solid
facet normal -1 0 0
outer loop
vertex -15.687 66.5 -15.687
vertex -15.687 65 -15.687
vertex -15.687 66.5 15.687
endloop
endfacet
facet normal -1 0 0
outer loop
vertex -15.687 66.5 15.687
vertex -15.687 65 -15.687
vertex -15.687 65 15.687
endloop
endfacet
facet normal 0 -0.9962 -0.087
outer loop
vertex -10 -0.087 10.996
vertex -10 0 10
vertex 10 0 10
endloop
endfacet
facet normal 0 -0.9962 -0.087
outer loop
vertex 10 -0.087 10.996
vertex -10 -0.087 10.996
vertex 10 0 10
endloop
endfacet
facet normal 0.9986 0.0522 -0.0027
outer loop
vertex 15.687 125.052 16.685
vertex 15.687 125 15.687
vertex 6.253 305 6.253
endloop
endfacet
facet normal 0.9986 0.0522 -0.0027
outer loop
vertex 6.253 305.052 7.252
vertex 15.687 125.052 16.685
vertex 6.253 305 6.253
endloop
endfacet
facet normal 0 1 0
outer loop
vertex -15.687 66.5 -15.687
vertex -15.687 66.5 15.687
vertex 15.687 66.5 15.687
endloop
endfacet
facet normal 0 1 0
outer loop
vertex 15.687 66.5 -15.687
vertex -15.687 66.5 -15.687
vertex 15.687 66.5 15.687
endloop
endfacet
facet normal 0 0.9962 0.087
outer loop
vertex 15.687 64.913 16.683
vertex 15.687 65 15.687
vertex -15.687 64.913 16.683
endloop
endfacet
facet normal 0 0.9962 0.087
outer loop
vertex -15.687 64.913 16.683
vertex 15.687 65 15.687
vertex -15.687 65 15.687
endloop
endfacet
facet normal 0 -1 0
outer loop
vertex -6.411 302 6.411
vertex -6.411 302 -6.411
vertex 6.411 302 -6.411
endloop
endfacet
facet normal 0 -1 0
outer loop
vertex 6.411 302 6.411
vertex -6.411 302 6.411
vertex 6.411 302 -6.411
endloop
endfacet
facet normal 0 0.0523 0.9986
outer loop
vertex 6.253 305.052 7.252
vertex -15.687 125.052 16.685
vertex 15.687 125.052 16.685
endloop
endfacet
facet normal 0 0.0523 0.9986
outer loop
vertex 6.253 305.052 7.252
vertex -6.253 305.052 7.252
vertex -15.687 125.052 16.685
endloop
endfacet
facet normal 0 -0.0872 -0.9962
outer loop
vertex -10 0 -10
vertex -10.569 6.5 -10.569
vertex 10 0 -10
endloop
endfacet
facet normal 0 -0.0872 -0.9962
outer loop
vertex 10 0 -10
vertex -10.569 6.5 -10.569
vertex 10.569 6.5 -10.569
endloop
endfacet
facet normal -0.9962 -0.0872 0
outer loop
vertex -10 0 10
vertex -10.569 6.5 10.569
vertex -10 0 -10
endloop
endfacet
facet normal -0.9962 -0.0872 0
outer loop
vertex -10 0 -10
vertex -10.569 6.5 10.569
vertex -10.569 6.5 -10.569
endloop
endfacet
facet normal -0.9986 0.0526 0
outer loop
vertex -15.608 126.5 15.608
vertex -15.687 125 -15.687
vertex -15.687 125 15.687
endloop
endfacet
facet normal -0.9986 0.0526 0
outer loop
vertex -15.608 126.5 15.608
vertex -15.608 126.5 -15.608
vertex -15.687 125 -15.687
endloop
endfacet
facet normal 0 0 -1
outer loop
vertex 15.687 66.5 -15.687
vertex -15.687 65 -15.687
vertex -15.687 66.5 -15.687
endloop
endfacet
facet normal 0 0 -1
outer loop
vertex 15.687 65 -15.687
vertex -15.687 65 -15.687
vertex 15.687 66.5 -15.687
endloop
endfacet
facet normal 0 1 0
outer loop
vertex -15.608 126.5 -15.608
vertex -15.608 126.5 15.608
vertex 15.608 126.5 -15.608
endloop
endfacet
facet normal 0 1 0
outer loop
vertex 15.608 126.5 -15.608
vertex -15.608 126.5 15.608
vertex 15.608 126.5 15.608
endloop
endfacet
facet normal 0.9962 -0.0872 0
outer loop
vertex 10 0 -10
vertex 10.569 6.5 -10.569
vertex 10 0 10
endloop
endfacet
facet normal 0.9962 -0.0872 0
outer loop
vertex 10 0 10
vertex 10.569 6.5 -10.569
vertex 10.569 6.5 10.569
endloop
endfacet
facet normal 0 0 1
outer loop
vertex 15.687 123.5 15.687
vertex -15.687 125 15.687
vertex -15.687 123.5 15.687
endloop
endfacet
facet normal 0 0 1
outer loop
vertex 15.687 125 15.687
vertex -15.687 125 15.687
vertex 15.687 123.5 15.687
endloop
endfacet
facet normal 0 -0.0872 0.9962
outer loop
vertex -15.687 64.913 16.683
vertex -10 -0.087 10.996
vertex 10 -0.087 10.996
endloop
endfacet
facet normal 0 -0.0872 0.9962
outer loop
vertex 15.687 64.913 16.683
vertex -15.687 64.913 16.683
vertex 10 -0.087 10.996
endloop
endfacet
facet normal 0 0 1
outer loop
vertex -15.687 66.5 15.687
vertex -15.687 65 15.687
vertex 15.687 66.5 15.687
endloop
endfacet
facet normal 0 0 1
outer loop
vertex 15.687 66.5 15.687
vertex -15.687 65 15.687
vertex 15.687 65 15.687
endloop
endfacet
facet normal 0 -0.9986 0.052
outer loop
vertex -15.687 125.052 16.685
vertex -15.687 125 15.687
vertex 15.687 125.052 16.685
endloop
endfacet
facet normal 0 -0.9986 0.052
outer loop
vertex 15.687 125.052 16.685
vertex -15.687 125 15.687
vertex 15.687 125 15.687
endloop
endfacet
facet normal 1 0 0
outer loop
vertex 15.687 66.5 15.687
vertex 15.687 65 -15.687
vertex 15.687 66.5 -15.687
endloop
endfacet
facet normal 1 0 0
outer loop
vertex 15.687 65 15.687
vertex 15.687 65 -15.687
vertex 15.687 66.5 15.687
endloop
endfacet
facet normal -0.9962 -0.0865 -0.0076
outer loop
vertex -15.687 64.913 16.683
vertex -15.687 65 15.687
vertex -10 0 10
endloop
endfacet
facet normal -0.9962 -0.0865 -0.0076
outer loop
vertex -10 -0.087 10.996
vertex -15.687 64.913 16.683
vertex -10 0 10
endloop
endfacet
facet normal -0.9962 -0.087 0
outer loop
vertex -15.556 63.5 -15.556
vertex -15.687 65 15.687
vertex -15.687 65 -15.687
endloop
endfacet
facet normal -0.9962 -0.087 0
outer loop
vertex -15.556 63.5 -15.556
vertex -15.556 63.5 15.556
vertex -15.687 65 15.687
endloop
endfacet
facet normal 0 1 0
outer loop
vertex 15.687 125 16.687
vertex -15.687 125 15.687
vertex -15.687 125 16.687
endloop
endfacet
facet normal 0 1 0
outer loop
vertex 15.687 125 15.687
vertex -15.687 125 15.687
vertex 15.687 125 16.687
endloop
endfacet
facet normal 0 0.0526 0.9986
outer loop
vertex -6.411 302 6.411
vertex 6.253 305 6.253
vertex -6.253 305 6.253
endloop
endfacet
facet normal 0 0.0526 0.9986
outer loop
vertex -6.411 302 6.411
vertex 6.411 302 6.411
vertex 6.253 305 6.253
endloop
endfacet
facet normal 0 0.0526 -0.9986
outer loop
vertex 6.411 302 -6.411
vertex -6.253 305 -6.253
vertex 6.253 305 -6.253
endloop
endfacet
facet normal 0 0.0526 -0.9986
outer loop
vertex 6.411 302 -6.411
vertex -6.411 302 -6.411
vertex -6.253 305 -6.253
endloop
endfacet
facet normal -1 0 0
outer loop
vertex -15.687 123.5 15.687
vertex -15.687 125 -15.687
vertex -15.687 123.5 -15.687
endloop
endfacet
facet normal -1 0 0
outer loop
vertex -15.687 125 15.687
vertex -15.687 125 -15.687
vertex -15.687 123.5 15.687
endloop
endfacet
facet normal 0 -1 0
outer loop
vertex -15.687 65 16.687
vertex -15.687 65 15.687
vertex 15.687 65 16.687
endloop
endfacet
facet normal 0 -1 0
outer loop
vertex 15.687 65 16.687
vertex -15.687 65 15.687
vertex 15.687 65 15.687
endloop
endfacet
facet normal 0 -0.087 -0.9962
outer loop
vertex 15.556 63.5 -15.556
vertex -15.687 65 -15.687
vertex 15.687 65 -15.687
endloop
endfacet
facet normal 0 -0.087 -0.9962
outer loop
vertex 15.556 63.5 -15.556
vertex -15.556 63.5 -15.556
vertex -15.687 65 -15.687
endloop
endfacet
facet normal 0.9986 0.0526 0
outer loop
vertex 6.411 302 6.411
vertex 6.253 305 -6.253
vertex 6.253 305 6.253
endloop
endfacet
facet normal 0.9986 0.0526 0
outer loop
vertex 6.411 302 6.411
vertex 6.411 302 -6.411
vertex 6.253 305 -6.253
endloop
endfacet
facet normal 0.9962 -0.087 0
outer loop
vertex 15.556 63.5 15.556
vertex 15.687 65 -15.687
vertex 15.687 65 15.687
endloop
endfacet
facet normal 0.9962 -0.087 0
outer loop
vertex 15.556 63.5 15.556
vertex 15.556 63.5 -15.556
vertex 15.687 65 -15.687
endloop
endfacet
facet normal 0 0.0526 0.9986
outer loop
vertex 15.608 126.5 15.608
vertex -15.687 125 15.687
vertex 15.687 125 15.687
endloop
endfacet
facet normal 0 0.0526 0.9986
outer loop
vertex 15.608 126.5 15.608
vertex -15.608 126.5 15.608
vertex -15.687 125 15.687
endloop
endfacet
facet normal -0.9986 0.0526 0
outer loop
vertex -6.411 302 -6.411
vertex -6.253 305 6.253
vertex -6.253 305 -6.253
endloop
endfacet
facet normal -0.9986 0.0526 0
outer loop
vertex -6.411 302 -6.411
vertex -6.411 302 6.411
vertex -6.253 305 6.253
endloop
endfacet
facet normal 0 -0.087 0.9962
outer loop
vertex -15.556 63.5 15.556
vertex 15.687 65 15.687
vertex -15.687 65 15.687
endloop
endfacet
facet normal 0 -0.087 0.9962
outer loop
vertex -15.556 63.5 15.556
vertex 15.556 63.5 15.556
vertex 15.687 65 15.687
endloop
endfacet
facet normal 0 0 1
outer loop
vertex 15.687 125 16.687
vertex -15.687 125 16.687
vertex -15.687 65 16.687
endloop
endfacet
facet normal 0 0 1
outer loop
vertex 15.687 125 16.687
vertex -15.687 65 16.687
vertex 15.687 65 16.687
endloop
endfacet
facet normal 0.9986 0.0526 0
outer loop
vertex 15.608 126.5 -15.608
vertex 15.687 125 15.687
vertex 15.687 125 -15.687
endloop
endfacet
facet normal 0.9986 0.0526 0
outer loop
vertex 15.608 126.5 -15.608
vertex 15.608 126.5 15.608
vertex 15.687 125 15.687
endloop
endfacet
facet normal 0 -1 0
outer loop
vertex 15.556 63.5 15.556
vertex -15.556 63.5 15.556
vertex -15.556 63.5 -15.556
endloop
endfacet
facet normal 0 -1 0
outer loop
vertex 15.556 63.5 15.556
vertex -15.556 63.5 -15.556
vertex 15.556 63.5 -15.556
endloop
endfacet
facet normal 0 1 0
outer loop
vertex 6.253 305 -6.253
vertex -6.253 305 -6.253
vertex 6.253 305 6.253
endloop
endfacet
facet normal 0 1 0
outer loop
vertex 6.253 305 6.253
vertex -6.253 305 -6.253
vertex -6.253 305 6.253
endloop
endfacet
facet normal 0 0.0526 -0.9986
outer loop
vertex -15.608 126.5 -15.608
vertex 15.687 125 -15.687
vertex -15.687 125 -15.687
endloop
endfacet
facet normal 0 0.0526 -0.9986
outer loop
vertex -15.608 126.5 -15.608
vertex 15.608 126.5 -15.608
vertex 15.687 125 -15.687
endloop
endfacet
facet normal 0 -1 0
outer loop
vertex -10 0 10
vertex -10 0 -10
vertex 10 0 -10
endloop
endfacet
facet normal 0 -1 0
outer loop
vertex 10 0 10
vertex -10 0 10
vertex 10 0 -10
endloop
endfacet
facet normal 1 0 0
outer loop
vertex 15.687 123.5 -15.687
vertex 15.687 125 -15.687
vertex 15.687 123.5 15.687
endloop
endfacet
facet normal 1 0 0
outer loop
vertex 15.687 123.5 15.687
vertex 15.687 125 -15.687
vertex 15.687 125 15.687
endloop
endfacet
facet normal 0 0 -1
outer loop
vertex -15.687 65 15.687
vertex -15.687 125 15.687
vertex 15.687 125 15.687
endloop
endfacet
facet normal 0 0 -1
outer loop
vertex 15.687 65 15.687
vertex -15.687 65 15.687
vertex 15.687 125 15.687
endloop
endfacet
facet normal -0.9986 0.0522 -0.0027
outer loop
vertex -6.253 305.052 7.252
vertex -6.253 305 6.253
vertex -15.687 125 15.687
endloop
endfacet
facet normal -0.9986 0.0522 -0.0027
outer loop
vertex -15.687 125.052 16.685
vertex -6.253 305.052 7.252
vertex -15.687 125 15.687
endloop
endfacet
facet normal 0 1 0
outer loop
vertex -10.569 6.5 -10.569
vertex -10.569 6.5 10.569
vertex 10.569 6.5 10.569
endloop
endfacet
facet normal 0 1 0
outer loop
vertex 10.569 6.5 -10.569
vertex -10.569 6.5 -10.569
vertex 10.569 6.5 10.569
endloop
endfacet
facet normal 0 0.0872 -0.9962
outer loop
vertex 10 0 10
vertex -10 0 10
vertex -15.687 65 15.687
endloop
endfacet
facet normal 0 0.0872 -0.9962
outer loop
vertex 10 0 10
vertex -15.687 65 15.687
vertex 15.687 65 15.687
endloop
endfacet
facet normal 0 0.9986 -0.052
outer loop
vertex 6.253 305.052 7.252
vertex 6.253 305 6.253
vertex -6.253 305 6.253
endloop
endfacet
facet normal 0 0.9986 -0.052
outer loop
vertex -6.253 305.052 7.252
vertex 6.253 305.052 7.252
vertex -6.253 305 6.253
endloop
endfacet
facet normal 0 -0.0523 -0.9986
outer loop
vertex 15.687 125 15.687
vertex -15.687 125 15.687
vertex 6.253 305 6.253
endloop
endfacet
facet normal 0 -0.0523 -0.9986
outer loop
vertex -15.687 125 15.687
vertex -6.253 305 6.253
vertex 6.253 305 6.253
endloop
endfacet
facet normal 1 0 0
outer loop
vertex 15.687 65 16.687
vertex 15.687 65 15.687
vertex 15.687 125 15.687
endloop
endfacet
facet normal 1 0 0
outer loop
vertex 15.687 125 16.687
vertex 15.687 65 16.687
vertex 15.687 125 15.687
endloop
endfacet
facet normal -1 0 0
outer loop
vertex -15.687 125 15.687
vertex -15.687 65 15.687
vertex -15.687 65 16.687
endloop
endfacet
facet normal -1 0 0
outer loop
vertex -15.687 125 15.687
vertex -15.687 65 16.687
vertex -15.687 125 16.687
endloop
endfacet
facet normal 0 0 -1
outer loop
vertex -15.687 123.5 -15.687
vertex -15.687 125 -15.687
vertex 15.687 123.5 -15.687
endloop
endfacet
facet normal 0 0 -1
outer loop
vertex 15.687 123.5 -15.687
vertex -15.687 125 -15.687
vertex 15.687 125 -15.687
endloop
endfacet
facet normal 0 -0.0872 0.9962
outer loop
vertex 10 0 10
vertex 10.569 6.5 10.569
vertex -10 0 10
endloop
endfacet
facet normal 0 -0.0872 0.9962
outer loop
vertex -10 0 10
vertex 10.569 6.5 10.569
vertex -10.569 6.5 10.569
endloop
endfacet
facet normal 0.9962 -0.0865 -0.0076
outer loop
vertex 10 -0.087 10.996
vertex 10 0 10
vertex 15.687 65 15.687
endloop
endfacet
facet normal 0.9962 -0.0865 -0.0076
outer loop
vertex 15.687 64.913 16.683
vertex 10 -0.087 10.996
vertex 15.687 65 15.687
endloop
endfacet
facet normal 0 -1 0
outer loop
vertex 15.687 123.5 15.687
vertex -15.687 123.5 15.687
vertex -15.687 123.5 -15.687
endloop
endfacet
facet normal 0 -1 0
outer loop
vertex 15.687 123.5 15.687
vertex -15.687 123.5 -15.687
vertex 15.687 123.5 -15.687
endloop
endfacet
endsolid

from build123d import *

# Parameters (mm, degrees)
F0_W       = 20
F0_H       = 20
F1_DEPTH   = 6.5
F1_TAPER   = -5
F4_DEPTH   = 1
F5_W       = 31.3735262584
F5_H       = 31.3735262584
F6_DEPTH   = 1.5
F6_FACE_W  = 31.3735262584
F6_FACE_H  = 31.3735262584
F7_DEPTH   = 1.5
F7_TAPER   = 5
F9_W       = 31.3735262584
F9_H       = 60
F10_DEPTH  = 1
F11_W      = 31.3735262584
F11_H      = 31.3735262584
F12_DEPTH  = 1.5
F12_FACE_W = 31.3735262584
F12_FACE_H = 31.3735262584
F13_DEPTH  = 1.5
F13_TAPER  = 3
F16_DEPTH  = 1
F17_W      = 12.5067257165
F17_H      = 12.5067257165
F18_DEPTH  = 3
F18_TAPER  = -3


with BuildPart() as f1:
    # F0 (on Front) → F1 (new body)
    with BuildSketch(Plane.XZ):
        Rectangle(F0_W, F0_H)
    extrude(amount=-F1_DEPTH, taper=F1_TAPER)


with BuildPart() as f4:
    # F3 (on face) → F4 (new body)
    with BuildSketch(Plane(origin=(0, -0.8682408883, 9.9240387651), x_dir=(1, 0, 0), z_dir=(0, -0.0871557427, 0.9961946981))):
        Polygon((15.6867631292, 66.1198468678), (-15.6867631292, 66.1198468678), (-10, 0.8715574275), (10, 0.8715574275), align=None)
    extrude(amount=F4_DEPTH)


with BuildPart() as f6:
    # F5 (on offset) → F6 (new body)
    with BuildSketch(Plane.XZ.offset(-65)):
        Rectangle(F5_W, F5_H)
    extrude(amount=-F6_DEPTH)

    # F6_face (on face) → F7 (join)
    with BuildSketch(Plane.XZ.offset(-65)):
        Rectangle(F6_FACE_W, F6_FACE_H)
    extrude(amount=F7_DEPTH, taper=F7_TAPER)


with BuildPart() as f10:
    # F9 (on face) → F10 (new body)
    with BuildSketch(Plane.XY.offset(15.6867631292)):
        with Locations((0, 95)):
            Rectangle(F9_W, F9_H)
    extrude(amount=F10_DEPTH)


with BuildPart() as f12:
    # F11 (on offset) → F12 (new body)
    with BuildSketch(Plane.XZ.offset(-125)):
        Rectangle(F11_W, F11_H)
    extrude(amount=F12_DEPTH)

    # F12_face (on face) → F13 (join)
    with BuildSketch(Plane(origin=(0, 125, 0), x_dir=(1, 0, 0), z_dir=(0, 1, 0))):
        Rectangle(F12_FACE_W, F12_FACE_H)
    extrude(amount=F13_DEPTH, taper=F13_TAPER)


with BuildPart() as f16:
    # F15 (on face) → F16 (new body)
    with BuildSketch(Plane(origin=(0, 1.1622381613, 22.1768252185), x_dir=(1, 0, 0), z_dir=(0, 0.0523359562, 0.9986295348))):
        Polygon((-15.6867631292, 124.0077100956), (15.6867631292, 124.0077100956), (6.2533628582, 304.2547323752), (-6.2533628582, 304.2547323752), align=None)
    extrude(amount=F16_DEPTH)


with BuildPart() as f18:
    # F17 (on offset) → F18 (new body)
    with BuildSketch(Plane.XZ.offset(-305)):
        Rectangle(F17_W, F17_H)
    extrude(amount=F18_DEPTH, taper=F18_TAPER)


solid = Compound([f1.part, f4.part, f6.part, f10.part, f12.part, f16.part, f18.part])
